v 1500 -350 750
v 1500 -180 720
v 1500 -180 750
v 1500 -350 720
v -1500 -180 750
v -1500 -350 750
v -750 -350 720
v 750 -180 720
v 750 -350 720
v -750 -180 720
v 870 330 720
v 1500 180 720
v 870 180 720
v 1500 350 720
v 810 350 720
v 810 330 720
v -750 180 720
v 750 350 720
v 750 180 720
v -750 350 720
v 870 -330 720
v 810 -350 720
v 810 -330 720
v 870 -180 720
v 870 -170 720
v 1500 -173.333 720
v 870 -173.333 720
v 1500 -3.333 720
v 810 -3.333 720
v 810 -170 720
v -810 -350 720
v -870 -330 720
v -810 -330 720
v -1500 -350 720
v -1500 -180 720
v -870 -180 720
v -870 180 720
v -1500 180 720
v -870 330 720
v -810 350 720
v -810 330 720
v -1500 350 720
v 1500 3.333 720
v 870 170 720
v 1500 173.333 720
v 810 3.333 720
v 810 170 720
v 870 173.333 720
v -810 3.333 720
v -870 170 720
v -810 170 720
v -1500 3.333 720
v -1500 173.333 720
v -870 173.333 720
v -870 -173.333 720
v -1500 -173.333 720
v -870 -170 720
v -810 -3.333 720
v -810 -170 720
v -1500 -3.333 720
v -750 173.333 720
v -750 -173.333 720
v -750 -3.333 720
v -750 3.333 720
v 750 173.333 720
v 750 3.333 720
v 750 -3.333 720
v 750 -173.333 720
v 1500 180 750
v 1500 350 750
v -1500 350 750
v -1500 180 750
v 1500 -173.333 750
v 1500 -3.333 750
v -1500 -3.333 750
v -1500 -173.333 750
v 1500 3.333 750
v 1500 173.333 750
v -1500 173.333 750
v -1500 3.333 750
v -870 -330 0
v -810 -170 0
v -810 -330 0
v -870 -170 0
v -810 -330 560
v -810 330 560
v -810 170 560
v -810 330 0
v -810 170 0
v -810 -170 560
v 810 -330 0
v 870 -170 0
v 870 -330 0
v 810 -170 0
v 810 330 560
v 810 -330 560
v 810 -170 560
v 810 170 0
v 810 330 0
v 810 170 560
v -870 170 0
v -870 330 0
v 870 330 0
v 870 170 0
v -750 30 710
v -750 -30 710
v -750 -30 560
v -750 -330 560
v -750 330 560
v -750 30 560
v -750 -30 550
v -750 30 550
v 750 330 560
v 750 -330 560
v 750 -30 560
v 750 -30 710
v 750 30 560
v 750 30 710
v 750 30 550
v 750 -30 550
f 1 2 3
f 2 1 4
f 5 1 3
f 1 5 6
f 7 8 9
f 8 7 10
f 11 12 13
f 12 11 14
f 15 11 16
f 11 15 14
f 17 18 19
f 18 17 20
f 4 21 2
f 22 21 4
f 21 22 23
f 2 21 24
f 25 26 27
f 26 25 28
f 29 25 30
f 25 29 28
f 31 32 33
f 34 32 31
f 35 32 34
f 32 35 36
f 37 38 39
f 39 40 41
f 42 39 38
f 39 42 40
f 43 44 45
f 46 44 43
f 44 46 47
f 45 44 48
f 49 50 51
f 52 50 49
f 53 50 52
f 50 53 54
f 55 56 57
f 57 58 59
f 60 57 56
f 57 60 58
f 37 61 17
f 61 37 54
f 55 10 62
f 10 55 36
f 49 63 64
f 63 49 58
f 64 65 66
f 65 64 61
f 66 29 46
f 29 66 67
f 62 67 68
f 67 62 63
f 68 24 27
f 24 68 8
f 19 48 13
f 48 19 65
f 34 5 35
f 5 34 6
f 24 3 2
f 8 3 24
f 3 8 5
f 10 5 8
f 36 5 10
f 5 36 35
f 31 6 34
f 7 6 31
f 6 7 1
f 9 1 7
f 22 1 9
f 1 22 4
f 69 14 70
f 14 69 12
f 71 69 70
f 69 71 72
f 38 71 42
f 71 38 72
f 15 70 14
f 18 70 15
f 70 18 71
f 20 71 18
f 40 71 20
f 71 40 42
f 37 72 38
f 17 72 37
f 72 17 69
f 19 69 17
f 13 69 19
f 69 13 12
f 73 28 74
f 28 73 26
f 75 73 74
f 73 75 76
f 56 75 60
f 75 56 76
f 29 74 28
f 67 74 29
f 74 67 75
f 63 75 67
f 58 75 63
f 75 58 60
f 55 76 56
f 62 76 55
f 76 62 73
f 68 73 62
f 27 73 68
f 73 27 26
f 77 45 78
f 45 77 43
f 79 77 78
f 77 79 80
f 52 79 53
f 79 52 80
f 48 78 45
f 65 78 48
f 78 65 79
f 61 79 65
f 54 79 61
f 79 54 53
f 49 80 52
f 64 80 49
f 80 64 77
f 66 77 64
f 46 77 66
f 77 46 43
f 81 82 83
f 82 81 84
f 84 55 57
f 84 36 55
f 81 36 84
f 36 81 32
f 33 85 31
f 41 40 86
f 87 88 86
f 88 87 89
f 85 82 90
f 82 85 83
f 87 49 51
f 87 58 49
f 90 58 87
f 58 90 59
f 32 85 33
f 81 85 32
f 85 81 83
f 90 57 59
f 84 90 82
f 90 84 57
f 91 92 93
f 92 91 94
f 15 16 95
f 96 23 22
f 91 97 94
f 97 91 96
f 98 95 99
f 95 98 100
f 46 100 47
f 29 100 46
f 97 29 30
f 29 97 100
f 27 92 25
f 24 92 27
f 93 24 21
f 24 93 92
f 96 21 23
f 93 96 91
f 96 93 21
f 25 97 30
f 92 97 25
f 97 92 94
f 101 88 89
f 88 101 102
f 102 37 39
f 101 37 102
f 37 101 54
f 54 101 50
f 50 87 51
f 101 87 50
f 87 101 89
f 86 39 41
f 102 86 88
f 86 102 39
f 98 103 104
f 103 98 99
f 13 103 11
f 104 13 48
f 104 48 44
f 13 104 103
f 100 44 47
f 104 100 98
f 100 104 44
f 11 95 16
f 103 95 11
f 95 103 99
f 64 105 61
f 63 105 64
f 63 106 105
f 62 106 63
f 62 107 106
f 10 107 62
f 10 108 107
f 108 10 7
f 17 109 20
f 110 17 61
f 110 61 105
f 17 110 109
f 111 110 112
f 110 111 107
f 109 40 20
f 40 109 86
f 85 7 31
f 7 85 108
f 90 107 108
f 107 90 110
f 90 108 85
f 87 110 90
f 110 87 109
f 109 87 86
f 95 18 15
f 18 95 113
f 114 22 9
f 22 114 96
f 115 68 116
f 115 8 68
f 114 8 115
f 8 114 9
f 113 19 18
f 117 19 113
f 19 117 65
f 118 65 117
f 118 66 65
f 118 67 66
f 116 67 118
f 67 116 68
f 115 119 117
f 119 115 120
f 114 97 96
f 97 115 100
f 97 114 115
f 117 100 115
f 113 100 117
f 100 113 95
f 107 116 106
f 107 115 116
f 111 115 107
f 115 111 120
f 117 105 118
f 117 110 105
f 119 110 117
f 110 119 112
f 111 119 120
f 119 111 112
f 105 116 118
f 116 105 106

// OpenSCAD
/******************************************************************************!
 * \file table-de-jardin.scad
 * \author Sebastien Beaugrand
 * \sa http://beaugrand.chez.com/
 * \copyright CeCILL 2.1 Free Software license
 ******************************************************************************/
L=3000;  // Longueur plateau
l=700;   // Largeur plateau
T=1500;  // Longueur traverse
H=750;   // Hauteur
pb=160;  // Profondeur bastaing
eb=60;   // Epaisseur bastaing
pd=170;  // Profondeur demi-bastaing
ed=30;   // Epaisseur demi-bastaing
ec=20;   // Ecart plateau/poteau
module planche() { cube([L,pd,ed]); }
module poteau() { cube([H-ed,pb,eb]); }
module trapeze() {
  CubePoints = [
    [0,0,0 ],[l,0,0 ],[l-ec,pb,0 ],[ec,pb,0 ],
    [0,0,eb],[l,0,eb],[l-ec,pb,eb],[ec,pb,eb]];
  CubeFaces = [
    [0,1,2,3],[4,5,1,0],[7,6,5,4],
    [5,6,2,1],[6,7,3,2],[7,4,0,3]];
  polyhedron(CubePoints, CubeFaces);
}
module traverse() { cube([T,pb,eb]); }
translate([-L/2,-l/2,   H-ed]) planche();
translate([-L/2, l/2-pd,H-ed]) planche();
translate([-L/2,-(l-pd*4)/6-pd,H-ed]) planche();
translate([-L/2, (l-pd*4)/6,   H-ed]) planche();
translate([-T/2-eb,  -l/2+ec,   0]) rotate ([0,-90,0]) poteau();
translate([ T/2+eb*2,-l/2+ec,   0]) rotate ([0,-90,0]) poteau();
translate([-T/2-eb,   l/2-ec-pb,0]) rotate ([0,-90,0]) poteau();
translate([ T/2+eb*2, l/2-ec-pb,0]) rotate ([0,-90,0]) poteau();
translate([-T/2,   -l/2,H-ed]) rotate ([-90,0,90]) trapeze();
translate([ T/2+eb,-l/2,H-ed]) rotate ([-90,0,90]) trapeze();
translate([-T/2,eb/2,H-ed-pb-10]) rotate ([90,0,0]) traverse();
